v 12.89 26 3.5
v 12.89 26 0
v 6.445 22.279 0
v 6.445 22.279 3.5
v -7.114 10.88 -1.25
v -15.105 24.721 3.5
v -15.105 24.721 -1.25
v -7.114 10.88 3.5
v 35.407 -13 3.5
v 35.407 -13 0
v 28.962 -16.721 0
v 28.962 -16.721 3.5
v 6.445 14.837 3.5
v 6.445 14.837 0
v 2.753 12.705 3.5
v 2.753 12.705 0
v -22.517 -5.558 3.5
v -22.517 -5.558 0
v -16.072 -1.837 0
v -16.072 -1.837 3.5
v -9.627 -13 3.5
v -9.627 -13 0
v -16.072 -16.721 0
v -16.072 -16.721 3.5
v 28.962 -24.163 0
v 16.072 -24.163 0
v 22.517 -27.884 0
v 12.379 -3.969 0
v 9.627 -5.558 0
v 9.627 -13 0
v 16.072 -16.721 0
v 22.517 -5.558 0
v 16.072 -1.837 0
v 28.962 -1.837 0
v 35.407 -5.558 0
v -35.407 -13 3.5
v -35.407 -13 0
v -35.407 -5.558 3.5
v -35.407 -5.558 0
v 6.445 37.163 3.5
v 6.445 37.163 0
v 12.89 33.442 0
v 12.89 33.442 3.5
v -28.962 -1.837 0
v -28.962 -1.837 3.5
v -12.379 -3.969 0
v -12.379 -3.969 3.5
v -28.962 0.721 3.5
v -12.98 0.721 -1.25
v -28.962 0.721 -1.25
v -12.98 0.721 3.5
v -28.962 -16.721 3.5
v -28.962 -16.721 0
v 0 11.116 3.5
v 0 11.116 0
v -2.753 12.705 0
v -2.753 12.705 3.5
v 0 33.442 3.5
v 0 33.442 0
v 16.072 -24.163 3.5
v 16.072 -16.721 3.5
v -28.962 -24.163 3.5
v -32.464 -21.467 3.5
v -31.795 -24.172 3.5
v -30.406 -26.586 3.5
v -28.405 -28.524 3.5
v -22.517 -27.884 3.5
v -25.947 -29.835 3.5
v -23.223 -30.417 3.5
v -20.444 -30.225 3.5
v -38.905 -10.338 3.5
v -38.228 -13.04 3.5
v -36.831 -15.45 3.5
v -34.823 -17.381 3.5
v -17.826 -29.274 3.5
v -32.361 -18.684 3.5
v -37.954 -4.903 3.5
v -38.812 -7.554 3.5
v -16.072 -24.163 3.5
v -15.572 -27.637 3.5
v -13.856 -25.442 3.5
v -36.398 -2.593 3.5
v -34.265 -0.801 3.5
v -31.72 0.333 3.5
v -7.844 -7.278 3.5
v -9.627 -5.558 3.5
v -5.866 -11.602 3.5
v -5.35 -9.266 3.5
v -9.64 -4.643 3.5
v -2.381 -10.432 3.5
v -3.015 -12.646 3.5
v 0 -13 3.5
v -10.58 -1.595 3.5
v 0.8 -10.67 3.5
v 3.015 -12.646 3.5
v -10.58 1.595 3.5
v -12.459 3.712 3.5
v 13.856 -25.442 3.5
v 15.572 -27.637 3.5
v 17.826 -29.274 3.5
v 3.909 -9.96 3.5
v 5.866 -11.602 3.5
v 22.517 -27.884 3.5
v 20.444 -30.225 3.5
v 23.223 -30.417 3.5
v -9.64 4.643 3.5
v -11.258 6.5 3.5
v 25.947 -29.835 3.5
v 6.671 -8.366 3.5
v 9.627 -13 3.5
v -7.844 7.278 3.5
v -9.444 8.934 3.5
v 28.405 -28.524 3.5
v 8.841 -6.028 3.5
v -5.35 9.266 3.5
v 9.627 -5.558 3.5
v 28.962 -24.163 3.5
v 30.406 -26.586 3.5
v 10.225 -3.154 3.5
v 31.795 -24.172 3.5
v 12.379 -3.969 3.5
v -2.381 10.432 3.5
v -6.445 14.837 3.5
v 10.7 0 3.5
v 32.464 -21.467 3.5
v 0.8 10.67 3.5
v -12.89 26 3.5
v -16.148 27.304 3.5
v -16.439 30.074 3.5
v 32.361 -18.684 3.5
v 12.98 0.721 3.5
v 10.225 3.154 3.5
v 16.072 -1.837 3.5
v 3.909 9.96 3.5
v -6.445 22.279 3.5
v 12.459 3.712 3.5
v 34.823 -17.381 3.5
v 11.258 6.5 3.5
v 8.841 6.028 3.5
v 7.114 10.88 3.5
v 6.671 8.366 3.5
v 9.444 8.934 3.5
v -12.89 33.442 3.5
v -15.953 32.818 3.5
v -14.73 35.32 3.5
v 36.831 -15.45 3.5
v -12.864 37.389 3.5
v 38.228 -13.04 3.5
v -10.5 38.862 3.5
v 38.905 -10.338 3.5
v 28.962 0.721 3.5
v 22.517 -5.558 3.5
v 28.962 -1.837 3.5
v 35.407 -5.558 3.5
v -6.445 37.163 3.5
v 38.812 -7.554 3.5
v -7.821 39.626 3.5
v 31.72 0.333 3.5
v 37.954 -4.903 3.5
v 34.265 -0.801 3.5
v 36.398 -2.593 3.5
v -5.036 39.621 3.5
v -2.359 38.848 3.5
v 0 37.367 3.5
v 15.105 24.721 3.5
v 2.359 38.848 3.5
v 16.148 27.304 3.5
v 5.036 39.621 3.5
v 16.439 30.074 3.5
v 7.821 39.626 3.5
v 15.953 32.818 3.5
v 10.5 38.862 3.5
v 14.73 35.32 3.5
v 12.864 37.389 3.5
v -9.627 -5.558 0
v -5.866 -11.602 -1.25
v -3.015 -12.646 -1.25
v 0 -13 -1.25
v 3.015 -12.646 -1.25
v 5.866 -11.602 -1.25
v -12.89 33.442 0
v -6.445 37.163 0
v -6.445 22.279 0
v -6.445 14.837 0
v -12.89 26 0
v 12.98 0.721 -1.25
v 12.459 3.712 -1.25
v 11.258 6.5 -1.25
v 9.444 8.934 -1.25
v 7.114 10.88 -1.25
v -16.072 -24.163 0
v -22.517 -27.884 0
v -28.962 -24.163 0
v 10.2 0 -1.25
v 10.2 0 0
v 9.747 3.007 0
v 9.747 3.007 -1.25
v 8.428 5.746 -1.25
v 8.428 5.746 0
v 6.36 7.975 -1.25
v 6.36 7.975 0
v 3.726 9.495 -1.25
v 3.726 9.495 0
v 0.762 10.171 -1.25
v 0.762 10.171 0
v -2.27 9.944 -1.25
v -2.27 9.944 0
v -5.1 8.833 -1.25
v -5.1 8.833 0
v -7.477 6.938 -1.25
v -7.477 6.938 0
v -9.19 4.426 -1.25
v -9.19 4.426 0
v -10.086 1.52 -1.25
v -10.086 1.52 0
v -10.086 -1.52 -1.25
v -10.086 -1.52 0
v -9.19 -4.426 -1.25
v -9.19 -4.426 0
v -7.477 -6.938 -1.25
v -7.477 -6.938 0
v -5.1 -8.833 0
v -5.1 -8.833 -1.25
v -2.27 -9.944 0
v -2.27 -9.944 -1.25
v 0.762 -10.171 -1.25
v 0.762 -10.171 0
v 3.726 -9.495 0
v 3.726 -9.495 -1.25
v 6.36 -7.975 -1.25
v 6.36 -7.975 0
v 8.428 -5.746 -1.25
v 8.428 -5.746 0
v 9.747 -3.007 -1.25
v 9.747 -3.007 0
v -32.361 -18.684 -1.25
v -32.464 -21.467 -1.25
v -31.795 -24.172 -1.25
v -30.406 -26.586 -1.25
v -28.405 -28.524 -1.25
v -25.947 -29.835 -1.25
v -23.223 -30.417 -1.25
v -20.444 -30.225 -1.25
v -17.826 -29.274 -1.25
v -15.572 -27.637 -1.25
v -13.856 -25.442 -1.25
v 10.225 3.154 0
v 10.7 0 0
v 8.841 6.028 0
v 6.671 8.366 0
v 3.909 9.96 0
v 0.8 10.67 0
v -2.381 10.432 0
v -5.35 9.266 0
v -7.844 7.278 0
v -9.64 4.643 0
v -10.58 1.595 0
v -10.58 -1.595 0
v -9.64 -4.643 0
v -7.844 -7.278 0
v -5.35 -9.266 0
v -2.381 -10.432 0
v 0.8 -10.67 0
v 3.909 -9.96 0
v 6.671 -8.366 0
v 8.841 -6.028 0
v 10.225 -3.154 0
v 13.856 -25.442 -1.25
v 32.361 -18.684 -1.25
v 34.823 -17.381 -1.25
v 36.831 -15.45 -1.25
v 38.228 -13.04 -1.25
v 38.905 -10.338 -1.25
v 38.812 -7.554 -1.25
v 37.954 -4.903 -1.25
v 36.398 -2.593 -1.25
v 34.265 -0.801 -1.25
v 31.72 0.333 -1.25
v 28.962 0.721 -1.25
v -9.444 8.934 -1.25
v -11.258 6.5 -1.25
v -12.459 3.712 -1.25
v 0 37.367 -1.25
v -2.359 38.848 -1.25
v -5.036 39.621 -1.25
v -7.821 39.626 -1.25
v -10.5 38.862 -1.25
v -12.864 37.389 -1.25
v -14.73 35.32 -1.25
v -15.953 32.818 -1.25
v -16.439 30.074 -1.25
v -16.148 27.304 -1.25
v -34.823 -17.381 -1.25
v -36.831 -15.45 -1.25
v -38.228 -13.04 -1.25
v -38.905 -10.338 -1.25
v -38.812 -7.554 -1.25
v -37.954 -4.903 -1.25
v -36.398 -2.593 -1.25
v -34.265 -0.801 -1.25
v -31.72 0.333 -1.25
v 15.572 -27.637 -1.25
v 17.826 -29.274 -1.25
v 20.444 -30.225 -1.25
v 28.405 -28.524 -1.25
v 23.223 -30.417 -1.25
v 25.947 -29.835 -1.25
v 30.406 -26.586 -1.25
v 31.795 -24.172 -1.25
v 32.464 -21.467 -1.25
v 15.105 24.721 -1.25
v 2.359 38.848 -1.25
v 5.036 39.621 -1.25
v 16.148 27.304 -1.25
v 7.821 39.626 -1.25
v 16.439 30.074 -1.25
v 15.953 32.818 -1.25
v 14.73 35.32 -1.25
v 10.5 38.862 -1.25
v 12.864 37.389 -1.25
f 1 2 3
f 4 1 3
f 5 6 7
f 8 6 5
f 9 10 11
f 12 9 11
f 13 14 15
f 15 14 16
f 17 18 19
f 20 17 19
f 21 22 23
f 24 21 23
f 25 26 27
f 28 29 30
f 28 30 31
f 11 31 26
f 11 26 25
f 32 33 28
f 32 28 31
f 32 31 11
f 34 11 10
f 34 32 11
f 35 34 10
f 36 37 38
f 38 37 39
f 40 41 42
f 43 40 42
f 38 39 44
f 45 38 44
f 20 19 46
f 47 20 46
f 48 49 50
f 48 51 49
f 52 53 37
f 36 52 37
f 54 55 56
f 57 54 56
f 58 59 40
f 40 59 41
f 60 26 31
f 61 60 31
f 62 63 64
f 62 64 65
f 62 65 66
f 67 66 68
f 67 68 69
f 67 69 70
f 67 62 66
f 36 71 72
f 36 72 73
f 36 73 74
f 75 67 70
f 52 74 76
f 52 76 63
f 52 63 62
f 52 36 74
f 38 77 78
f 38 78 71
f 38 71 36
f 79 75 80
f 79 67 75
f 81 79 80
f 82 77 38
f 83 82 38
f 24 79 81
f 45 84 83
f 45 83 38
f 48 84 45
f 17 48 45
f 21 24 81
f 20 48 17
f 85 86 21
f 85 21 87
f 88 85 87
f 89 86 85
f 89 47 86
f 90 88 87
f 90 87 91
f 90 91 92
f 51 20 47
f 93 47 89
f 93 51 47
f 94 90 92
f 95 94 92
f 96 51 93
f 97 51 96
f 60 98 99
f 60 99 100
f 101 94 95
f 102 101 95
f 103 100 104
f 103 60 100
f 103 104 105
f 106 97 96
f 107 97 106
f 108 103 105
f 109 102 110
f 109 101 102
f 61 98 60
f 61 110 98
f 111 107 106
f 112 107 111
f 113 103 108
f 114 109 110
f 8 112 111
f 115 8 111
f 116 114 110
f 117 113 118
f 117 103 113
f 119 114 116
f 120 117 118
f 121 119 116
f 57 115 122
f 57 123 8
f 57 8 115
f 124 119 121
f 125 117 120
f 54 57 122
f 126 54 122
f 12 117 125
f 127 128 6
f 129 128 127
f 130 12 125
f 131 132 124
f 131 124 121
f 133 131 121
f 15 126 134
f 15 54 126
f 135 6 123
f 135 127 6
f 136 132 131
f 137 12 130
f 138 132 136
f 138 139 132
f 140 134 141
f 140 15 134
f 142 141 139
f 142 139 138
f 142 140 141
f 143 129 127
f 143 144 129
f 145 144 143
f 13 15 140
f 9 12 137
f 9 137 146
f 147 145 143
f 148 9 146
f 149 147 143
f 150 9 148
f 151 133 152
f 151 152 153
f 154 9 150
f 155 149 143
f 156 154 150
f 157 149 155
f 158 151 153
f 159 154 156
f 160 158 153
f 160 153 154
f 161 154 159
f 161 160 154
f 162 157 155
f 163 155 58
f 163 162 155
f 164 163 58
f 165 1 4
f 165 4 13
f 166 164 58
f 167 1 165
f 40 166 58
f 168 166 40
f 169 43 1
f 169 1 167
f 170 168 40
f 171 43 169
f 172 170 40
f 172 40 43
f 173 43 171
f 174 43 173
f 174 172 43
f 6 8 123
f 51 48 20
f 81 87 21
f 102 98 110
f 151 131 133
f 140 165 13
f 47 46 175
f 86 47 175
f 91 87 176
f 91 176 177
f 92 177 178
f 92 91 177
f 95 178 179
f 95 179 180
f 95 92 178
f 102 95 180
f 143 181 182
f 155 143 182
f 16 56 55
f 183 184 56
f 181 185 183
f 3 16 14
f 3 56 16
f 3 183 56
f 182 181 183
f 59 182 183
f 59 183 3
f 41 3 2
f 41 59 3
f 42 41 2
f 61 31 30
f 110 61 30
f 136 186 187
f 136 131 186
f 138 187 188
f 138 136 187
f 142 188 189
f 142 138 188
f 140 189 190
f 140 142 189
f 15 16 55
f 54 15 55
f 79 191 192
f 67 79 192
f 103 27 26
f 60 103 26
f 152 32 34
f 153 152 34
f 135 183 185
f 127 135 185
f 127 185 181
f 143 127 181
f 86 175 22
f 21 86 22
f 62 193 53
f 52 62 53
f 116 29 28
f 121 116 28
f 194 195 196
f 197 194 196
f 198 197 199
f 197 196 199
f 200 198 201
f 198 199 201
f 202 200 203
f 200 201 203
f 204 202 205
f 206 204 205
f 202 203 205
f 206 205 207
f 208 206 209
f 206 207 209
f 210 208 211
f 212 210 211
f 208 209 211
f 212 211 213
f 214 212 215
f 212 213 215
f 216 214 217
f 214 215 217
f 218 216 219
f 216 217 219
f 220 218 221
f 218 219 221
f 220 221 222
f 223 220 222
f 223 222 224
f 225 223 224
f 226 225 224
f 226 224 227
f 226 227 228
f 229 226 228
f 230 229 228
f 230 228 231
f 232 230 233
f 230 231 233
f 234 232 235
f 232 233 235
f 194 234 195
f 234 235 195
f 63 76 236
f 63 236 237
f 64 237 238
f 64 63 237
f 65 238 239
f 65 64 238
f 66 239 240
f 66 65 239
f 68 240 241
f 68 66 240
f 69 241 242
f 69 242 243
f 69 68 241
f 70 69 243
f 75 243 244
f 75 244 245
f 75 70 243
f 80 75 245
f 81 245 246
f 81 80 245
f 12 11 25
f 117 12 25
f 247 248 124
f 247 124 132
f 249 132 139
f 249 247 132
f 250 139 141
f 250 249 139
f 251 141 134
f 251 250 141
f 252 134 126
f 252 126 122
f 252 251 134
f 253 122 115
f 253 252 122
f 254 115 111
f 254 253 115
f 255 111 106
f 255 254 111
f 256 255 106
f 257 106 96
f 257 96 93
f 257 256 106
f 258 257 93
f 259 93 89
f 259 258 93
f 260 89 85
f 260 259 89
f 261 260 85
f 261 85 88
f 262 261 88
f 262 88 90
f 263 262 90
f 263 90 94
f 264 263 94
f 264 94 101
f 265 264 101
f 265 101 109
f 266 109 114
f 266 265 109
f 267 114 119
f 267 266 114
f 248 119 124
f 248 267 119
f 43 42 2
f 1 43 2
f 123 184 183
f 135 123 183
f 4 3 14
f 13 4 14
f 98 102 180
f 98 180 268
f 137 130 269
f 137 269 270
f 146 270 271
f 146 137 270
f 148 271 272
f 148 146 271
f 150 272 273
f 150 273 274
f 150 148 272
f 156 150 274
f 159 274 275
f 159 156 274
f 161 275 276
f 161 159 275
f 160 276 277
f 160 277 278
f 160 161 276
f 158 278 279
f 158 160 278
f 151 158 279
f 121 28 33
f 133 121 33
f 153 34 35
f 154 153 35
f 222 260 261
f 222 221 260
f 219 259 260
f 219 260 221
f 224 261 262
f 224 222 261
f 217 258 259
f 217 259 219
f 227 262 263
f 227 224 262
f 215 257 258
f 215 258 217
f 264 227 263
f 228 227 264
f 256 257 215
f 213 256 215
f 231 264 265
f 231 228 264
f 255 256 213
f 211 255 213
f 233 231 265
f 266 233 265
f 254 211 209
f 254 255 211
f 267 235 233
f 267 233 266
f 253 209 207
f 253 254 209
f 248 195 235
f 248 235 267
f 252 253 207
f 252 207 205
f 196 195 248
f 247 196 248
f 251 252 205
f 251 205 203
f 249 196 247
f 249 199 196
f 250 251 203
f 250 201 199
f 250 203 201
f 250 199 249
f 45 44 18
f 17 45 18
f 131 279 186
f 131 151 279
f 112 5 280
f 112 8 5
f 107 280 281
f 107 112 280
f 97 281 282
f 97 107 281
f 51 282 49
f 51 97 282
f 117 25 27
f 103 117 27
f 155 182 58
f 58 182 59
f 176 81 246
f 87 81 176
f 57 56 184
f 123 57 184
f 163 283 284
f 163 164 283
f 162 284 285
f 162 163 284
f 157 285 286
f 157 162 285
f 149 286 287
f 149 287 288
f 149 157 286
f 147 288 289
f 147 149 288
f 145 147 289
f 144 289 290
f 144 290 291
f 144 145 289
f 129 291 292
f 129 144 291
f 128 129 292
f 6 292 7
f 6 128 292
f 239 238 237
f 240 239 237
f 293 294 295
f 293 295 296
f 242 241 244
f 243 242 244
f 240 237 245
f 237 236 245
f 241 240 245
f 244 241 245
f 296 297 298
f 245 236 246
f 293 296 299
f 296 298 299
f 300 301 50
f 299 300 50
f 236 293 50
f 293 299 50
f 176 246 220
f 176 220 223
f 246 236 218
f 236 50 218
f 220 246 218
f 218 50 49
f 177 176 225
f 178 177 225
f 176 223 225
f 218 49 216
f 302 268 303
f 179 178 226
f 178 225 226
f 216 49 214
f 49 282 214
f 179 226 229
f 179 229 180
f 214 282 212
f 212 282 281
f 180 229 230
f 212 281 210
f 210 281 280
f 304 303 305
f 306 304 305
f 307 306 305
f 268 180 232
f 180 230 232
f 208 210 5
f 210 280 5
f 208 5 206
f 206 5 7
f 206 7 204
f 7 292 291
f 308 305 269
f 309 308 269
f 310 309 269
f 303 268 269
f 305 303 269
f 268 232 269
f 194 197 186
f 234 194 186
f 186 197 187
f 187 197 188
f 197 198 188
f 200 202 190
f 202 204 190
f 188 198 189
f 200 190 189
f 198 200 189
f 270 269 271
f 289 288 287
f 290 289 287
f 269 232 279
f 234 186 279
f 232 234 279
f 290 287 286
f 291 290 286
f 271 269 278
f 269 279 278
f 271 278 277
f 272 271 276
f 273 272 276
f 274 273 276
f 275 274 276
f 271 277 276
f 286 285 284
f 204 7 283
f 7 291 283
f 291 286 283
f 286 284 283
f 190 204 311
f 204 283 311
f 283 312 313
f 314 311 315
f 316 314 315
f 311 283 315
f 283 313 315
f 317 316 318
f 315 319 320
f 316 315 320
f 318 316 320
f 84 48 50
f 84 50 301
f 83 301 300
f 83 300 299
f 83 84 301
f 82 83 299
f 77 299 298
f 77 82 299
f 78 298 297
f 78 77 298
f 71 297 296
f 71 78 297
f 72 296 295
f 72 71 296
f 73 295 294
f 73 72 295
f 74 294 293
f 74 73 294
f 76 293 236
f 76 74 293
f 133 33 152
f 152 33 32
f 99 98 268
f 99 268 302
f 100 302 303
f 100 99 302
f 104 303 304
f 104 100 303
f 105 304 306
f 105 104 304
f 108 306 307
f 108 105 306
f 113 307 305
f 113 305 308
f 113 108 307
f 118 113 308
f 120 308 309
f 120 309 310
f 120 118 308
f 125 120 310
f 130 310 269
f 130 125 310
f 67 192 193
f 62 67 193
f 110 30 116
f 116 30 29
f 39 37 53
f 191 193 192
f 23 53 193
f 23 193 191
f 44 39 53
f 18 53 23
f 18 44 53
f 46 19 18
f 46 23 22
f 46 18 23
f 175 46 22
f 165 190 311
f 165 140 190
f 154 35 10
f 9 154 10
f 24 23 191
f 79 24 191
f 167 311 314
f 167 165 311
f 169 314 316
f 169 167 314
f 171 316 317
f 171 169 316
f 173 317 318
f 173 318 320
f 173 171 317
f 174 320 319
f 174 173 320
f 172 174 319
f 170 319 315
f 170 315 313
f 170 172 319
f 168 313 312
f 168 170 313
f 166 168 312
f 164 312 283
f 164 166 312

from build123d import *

# Parameters (mm, degrees)
F0_R     = 10.7
F1_DEPTH = 3.5
F0_R_2   = 10.2
F2_DEPTH = 1.25


with BuildPart() as f1:
    # F0 (on Top) → F1 (new body)
    with BuildSketch(Plane.XY):
        with BuildLine():
            Line((-15.105254, 24.721022), (-7.114419, 10.880489))
            ThreePointArc((-7.114419, 10.880489), (-5.017235, 11.992804), (-2.752749, 12.70521))
            Line((-2.752749, 12.70521), (-6.445, 14.836933))
            Line((-6.445, 14.836933), (-6.445, 22.278978))
            Line((-6.445, 22.278978), (-12.89, 26))
            Line((-12.89, 26), (-12.89, 33.442045))
            Line((-12.89, 33.442045), (-6.445, 37.163067))
            Line((-6.445, 37.163067), (0, 33.442045))
            Line((0, 33.442045), (6.445, 37.163067))
            Line((6.445, 37.163067), (12.89, 33.442045))
            Line((12.89, 33.442045), (12.89, 26))
            Line((12.89, 26), (6.445, 22.278978))
            Line((6.445, 22.278978), (6.445, 14.836933))
            Line((6.445, 14.836933), (2.752749, 12.70521))
            ThreePointArc((2.752749, 12.70521), (5.017235, 11.992804), (7.114419, 10.880489))
            Line((7.114419, 10.880489), (15.105254, 24.721022))
            ThreePointArc((15.105254, 24.721022), (12.864302, 37.388653), (0, 37.367066))
            ThreePointArc((0, 37.367066), (-12.864302, 37.388653), (-15.105254, 24.721022))
        make_face()
        with BuildLine():
            ThreePointArc((-12.979989, 0.721022), (-12.894691, -1.651349), (-12.37941, -3.968655))
            Line((-12.37941, -3.968655), (-9.62666, -5.557955))
            Line((-9.62666, -5.557955), (-9.62666, -8.736556))
            ThreePointArc((-9.62666, -8.736556), (-7.877455, -10.341455), (-5.865571, -11.601512))
            ThreePointArc((-5.865571, -11.601512), (0, -13), (5.865571, -11.601512))
            ThreePointArc((5.865571, -11.601512), (7.877455, -10.341455), (9.62666, -8.736556))
            Line((9.62666, -8.736556), (9.62666, -5.557955))
            Line((9.62666, -5.557955), (12.37941, -3.968655))
            ThreePointArc((12.37941, -3.968655), (12.894691, -1.651349), (12.979989, 0.721022))
            ThreePointArc((12.979989, 0.721022), (11.25833, 6.5), (7.114419, 10.880489))
            ThreePointArc((7.114419, 10.880489), (5.017235, 11.992804), (2.752749, 12.70521))
            Line((2.752749, 12.70521), (0, 11.11591))
            Line((0, 11.11591), (-2.752749, 12.70521))
            ThreePointArc((-2.752749, 12.70521), (-5.017235, 11.992804), (-7.114419, 10.880489))
            ThreePointArc((-7.114419, 10.880489), (-11.25833, 6.5), (-12.979989, 0.721022))
        make_face()
        Circle(F0_R, mode=Mode.SUBTRACT)
        with BuildLine():
            ThreePointArc((9.62666, -8.736556), (7.877455, -10.341455), (5.865571, -11.601512))
            Line((5.865571, -11.601512), (13.856406, -25.442045))
            ThreePointArc((13.856406, -25.442045), (25.947372, -29.835139), (32.360828, -18.683533))
            ThreePointArc((32.360828, -18.683533), (38.811675, -7.553514), (28.96166, 0.721022))
            Line((28.96166, 0.721022), (12.979989, 0.721022))
            ThreePointArc((12.979989, 0.721022), (12.894691, -1.651349), (12.37941, -3.968655))
            Line((12.37941, -3.968655), (16.07166, -1.836933))
            Line((16.07166, -1.836933), (22.51666, -5.557955))
            Line((22.51666, -5.557955), (28.96166, -1.836933))
            Line((28.96166, -1.836933), (35.40666, -5.557955))
            Line((35.40666, -5.557955), (35.40666, -13))
            Line((35.40666, -13), (28.96166, -16.721022))
            Line((28.96166, -16.721022), (28.96166, -24.163067))
            Line((28.96166, -24.163067), (22.51666, -27.88409))
            Line((22.51666, -27.88409), (16.07166, -24.163067))
            Line((16.07166, -24.163067), (16.07166, -16.721022))
            Line((16.07166, -16.721022), (9.62666, -13))
            Line((9.62666, -13), (9.62666, -8.736556))
        make_face()
        with BuildLine():
            Line((-28.96166, -24.163067), (-28.96166, -16.721022))
            Line((-28.96166, -16.721022), (-35.40666, -13))
            Line((-35.40666, -13), (-35.40666, -5.557955))
            Line((-35.40666, -5.557955), (-28.96166, -1.836933))
            Line((-28.96166, -1.836933), (-22.51666, -5.557955))
            Line((-22.51666, -5.557955), (-16.07166, -1.836933))
            Line((-16.07166, -1.836933), (-12.37941, -3.968655))
            ThreePointArc((-12.37941, -3.968655), (-12.894691, -1.651349), (-12.979989, 0.721022))
            Line((-12.979989, 0.721022), (-28.96166, 0.721022))
            ThreePointArc((-28.96166, 0.721022), (-38.811675, -7.553514), (-32.360828, -18.683533))
            ThreePointArc((-32.360828, -18.683533), (-25.947372, -29.835139), (-13.856406, -25.442045))
            Line((-13.856406, -25.442045), (-5.865571, -11.601512))
            ThreePointArc((-5.865571, -11.601512), (-7.877455, -10.341455), (-9.62666, -8.736556))
            Line((-9.62666, -8.736556), (-9.62666, -13))
            Line((-9.62666, -13), (-16.07166, -16.721022))
            Line((-16.07166, -16.721022), (-16.07166, -24.163067))
            Line((-16.07166, -24.163067), (-22.51666, -27.88409))
            Line((-22.51666, -27.88409), (-28.96166, -24.163067))
        make_face()
    extrude(amount=F1_DEPTH)

    # F0 (on Top) → F2 (join)
    with BuildSketch(Plane.XY):
        with BuildLine():
            Line((-28.96166, -24.163067), (-28.96166, -16.721022))
            Line((-28.96166, -16.721022), (-35.40666, -13))
            Line((-35.40666, -13), (-35.40666, -5.557955))
            Line((-35.40666, -5.557955), (-28.96166, -1.836933))
            Line((-28.96166, -1.836933), (-22.51666, -5.557955))
            Line((-22.51666, -5.557955), (-16.07166, -1.836933))
            Line((-16.07166, -1.836933), (-12.37941, -3.968655))
            ThreePointArc((-12.37941, -3.968655), (-12.894691, -1.651349), (-12.979989, 0.721022))
            Line((-12.979989, 0.721022), (-28.96166, 0.721022))
            ThreePointArc((-28.96166, 0.721022), (-38.811675, -7.553514), (-32.360828, -18.683533))
            ThreePointArc((-32.360828, -18.683533), (-25.947372, -29.835139), (-13.856406, -25.442045))
            Line((-13.856406, -25.442045), (-5.865571, -11.601512))
            ThreePointArc((-5.865571, -11.601512), (-7.877455, -10.341455), (-9.62666, -8.736556))
            Line((-9.62666, -8.736556), (-9.62666, -13))
            Line((-9.62666, -13), (-16.07166, -16.721022))
            Line((-16.07166, -16.721022), (-16.07166, -24.163067))
            Line((-16.07166, -24.163067), (-22.51666, -27.88409))
            Line((-22.51666, -27.88409), (-28.96166, -24.163067))
        make_face()
        with BuildLine():
            ThreePointArc((-12.979989, 0.721022), (-12.894691, -1.651349), (-12.37941, -3.968655))
            Line((-12.37941, -3.968655), (-9.62666, -5.557955))
            Line((-9.62666, -5.557955), (-9.62666, -8.736556))
            ThreePointArc((-9.62666, -8.736556), (-7.877455, -10.341455), (-5.865571, -11.601512))
            ThreePointArc((-5.865571, -11.601512), (0, -13), (5.865571, -11.601512))
            ThreePointArc((5.865571, -11.601512), (7.877455, -10.341455), (9.62666, -8.736556))
            Line((9.62666, -8.736556), (9.62666, -5.557955))
            Line((9.62666, -5.557955), (12.37941, -3.968655))
            ThreePointArc((12.37941, -3.968655), (12.894691, -1.651349), (12.979989, 0.721022))
            ThreePointArc((12.979989, 0.721022), (11.25833, 6.5), (7.114419, 10.880489))
            ThreePointArc((7.114419, 10.880489), (5.017235, 11.992804), (2.752749, 12.70521))
            Line((2.752749, 12.70521), (0, 11.11591))
            Line((0, 11.11591), (-2.752749, 12.70521))
            ThreePointArc((-2.752749, 12.70521), (-5.017235, 11.992804), (-7.114419, 10.880489))
            ThreePointArc((-7.114419, 10.880489), (-11.25833, 6.5), (-12.979989, 0.721022))
        make_face()
        Circle(F0_R, mode=Mode.SUBTRACT)
        with BuildLine():
            Line((-15.105254, 24.721022), (-7.114419, 10.880489))
            ThreePointArc((-7.114419, 10.880489), (-5.017235, 11.992804), (-2.752749, 12.70521))
            Line((-2.752749, 12.70521), (-6.445, 14.836933))
            Line((-6.445, 14.836933), (-6.445, 22.278978))
            Line((-6.445, 22.278978), (-12.89, 26))
            Line((-12.89, 26), (-12.89, 33.442045))
            Line((-12.89, 33.442045), (-6.445, 37.163067))
            Line((-6.445, 37.163067), (0, 33.442045))
            Line((0, 33.442045), (6.445, 37.163067))
            Line((6.445, 37.163067), (12.89, 33.442045))
            Line((12.89, 33.442045), (12.89, 26))
            Line((12.89, 26), (6.445, 22.278978))
            Line((6.445, 22.278978), (6.445, 14.836933))
            Line((6.445, 14.836933), (2.752749, 12.70521))
            ThreePointArc((2.752749, 12.70521), (5.017235, 11.992804), (7.114419, 10.880489))
            Line((7.114419, 10.880489), (15.105254, 24.721022))
            ThreePointArc((15.105254, 24.721022), (12.864302, 37.388653), (0, 37.367066))
            ThreePointArc((0, 37.367066), (-12.864302, 37.388653), (-15.105254, 24.721022))
        make_face()
        with BuildLine():
            ThreePointArc((9.62666, -8.736556), (7.877455, -10.341455), (5.865571, -11.601512))
            Line((5.865571, -11.601512), (13.856406, -25.442045))
            ThreePointArc((13.856406, -25.442045), (25.947372, -29.835139), (32.360828, -18.683533))
            ThreePointArc((32.360828, -18.683533), (38.811675, -7.553514), (28.96166, 0.721022))
            Line((28.96166, 0.721022), (12.979989, 0.721022))
            ThreePointArc((12.979989, 0.721022), (12.894691, -1.651349), (12.37941, -3.968655))
            Line((12.37941, -3.968655), (16.07166, -1.836933))
            Line((16.07166, -1.836933), (22.51666, -5.557955))
            Line((22.51666, -5.557955), (28.96166, -1.836933))
            Line((28.96166, -1.836933), (35.40666, -5.557955))
            Line((35.40666, -5.557955), (35.40666, -13))
            Line((35.40666, -13), (28.96166, -16.721022))
            Line((28.96166, -16.721022), (28.96166, -24.163067))
            Line((28.96166, -24.163067), (22.51666, -27.88409))
            Line((22.51666, -27.88409), (16.07166, -24.163067))
            Line((16.07166, -24.163067), (16.07166, -16.721022))
            Line((16.07166, -16.721022), (9.62666, -13))
            Line((9.62666, -13), (9.62666, -8.736556))
        make_face()
        Polygon((22.51666, -13), (16.07166, -16.721022), (16.07166, -24.163067), (22.51666, -27.88409), (28.96166, -24.163067), (28.96166, -16.721022), align=None)
        Polygon((0, 33.442045), (0, 26), (6.445, 22.278978), (12.89, 26), (12.89, 33.442045), (6.445, 37.163067), align=None)
        Polygon((-12.89, 26), (-6.445, 22.278978), (0, 26), (0, 33.442045), (-6.445, 37.163067), (-12.89, 33.442045), align=None)
        Polygon((-6.445, 14.836933), (-2.752749, 12.70521), (0, 11.11591), (2.752749, 12.70521), (6.445, 14.836933), (6.445, 22.278978), (0, 26), (-6.445, 22.278978), align=None)
        Polygon((22.51666, -5.557955), (22.51666, -13), (28.96166, -16.721022), (35.40666, -13), (35.40666, -5.557955), (28.96166, -1.836933), align=None)
        Polygon((9.62666, -5.557955), (9.62666, -8.736556), (9.62666, -13), (16.07166, -16.721022), (22.51666, -13), (22.51666, -5.557955), (16.07166, -1.836933), (12.37941, -3.968655), align=None)
        Polygon((-22.51666, -5.557955), (-22.51666, -13), (-16.07166, -16.721022), (-9.62666, -13), (-9.62666, -8.736556), (-9.62666, -5.557955), (-12.37941, -3.968655), (-16.07166, -1.836933), align=None)
        Polygon((-28.96166, -16.721022), (-22.51666, -13), (-22.51666, -5.557955), (-28.96166, -1.836933), (-35.40666, -5.557955), (-35.40666, -13), align=None)
        Polygon((-16.07166, -16.721022), (-22.51666, -13), (-28.96166, -16.721022), (-28.96166, -24.163067), (-22.51666, -27.88409), (-16.07166, -24.163067), align=None)
        Circle(F0_R)
        Circle(F0_R_2, mode=Mode.SUBTRACT)
    extrude(amount=-F2_DEPTH)


solid = f1.part
